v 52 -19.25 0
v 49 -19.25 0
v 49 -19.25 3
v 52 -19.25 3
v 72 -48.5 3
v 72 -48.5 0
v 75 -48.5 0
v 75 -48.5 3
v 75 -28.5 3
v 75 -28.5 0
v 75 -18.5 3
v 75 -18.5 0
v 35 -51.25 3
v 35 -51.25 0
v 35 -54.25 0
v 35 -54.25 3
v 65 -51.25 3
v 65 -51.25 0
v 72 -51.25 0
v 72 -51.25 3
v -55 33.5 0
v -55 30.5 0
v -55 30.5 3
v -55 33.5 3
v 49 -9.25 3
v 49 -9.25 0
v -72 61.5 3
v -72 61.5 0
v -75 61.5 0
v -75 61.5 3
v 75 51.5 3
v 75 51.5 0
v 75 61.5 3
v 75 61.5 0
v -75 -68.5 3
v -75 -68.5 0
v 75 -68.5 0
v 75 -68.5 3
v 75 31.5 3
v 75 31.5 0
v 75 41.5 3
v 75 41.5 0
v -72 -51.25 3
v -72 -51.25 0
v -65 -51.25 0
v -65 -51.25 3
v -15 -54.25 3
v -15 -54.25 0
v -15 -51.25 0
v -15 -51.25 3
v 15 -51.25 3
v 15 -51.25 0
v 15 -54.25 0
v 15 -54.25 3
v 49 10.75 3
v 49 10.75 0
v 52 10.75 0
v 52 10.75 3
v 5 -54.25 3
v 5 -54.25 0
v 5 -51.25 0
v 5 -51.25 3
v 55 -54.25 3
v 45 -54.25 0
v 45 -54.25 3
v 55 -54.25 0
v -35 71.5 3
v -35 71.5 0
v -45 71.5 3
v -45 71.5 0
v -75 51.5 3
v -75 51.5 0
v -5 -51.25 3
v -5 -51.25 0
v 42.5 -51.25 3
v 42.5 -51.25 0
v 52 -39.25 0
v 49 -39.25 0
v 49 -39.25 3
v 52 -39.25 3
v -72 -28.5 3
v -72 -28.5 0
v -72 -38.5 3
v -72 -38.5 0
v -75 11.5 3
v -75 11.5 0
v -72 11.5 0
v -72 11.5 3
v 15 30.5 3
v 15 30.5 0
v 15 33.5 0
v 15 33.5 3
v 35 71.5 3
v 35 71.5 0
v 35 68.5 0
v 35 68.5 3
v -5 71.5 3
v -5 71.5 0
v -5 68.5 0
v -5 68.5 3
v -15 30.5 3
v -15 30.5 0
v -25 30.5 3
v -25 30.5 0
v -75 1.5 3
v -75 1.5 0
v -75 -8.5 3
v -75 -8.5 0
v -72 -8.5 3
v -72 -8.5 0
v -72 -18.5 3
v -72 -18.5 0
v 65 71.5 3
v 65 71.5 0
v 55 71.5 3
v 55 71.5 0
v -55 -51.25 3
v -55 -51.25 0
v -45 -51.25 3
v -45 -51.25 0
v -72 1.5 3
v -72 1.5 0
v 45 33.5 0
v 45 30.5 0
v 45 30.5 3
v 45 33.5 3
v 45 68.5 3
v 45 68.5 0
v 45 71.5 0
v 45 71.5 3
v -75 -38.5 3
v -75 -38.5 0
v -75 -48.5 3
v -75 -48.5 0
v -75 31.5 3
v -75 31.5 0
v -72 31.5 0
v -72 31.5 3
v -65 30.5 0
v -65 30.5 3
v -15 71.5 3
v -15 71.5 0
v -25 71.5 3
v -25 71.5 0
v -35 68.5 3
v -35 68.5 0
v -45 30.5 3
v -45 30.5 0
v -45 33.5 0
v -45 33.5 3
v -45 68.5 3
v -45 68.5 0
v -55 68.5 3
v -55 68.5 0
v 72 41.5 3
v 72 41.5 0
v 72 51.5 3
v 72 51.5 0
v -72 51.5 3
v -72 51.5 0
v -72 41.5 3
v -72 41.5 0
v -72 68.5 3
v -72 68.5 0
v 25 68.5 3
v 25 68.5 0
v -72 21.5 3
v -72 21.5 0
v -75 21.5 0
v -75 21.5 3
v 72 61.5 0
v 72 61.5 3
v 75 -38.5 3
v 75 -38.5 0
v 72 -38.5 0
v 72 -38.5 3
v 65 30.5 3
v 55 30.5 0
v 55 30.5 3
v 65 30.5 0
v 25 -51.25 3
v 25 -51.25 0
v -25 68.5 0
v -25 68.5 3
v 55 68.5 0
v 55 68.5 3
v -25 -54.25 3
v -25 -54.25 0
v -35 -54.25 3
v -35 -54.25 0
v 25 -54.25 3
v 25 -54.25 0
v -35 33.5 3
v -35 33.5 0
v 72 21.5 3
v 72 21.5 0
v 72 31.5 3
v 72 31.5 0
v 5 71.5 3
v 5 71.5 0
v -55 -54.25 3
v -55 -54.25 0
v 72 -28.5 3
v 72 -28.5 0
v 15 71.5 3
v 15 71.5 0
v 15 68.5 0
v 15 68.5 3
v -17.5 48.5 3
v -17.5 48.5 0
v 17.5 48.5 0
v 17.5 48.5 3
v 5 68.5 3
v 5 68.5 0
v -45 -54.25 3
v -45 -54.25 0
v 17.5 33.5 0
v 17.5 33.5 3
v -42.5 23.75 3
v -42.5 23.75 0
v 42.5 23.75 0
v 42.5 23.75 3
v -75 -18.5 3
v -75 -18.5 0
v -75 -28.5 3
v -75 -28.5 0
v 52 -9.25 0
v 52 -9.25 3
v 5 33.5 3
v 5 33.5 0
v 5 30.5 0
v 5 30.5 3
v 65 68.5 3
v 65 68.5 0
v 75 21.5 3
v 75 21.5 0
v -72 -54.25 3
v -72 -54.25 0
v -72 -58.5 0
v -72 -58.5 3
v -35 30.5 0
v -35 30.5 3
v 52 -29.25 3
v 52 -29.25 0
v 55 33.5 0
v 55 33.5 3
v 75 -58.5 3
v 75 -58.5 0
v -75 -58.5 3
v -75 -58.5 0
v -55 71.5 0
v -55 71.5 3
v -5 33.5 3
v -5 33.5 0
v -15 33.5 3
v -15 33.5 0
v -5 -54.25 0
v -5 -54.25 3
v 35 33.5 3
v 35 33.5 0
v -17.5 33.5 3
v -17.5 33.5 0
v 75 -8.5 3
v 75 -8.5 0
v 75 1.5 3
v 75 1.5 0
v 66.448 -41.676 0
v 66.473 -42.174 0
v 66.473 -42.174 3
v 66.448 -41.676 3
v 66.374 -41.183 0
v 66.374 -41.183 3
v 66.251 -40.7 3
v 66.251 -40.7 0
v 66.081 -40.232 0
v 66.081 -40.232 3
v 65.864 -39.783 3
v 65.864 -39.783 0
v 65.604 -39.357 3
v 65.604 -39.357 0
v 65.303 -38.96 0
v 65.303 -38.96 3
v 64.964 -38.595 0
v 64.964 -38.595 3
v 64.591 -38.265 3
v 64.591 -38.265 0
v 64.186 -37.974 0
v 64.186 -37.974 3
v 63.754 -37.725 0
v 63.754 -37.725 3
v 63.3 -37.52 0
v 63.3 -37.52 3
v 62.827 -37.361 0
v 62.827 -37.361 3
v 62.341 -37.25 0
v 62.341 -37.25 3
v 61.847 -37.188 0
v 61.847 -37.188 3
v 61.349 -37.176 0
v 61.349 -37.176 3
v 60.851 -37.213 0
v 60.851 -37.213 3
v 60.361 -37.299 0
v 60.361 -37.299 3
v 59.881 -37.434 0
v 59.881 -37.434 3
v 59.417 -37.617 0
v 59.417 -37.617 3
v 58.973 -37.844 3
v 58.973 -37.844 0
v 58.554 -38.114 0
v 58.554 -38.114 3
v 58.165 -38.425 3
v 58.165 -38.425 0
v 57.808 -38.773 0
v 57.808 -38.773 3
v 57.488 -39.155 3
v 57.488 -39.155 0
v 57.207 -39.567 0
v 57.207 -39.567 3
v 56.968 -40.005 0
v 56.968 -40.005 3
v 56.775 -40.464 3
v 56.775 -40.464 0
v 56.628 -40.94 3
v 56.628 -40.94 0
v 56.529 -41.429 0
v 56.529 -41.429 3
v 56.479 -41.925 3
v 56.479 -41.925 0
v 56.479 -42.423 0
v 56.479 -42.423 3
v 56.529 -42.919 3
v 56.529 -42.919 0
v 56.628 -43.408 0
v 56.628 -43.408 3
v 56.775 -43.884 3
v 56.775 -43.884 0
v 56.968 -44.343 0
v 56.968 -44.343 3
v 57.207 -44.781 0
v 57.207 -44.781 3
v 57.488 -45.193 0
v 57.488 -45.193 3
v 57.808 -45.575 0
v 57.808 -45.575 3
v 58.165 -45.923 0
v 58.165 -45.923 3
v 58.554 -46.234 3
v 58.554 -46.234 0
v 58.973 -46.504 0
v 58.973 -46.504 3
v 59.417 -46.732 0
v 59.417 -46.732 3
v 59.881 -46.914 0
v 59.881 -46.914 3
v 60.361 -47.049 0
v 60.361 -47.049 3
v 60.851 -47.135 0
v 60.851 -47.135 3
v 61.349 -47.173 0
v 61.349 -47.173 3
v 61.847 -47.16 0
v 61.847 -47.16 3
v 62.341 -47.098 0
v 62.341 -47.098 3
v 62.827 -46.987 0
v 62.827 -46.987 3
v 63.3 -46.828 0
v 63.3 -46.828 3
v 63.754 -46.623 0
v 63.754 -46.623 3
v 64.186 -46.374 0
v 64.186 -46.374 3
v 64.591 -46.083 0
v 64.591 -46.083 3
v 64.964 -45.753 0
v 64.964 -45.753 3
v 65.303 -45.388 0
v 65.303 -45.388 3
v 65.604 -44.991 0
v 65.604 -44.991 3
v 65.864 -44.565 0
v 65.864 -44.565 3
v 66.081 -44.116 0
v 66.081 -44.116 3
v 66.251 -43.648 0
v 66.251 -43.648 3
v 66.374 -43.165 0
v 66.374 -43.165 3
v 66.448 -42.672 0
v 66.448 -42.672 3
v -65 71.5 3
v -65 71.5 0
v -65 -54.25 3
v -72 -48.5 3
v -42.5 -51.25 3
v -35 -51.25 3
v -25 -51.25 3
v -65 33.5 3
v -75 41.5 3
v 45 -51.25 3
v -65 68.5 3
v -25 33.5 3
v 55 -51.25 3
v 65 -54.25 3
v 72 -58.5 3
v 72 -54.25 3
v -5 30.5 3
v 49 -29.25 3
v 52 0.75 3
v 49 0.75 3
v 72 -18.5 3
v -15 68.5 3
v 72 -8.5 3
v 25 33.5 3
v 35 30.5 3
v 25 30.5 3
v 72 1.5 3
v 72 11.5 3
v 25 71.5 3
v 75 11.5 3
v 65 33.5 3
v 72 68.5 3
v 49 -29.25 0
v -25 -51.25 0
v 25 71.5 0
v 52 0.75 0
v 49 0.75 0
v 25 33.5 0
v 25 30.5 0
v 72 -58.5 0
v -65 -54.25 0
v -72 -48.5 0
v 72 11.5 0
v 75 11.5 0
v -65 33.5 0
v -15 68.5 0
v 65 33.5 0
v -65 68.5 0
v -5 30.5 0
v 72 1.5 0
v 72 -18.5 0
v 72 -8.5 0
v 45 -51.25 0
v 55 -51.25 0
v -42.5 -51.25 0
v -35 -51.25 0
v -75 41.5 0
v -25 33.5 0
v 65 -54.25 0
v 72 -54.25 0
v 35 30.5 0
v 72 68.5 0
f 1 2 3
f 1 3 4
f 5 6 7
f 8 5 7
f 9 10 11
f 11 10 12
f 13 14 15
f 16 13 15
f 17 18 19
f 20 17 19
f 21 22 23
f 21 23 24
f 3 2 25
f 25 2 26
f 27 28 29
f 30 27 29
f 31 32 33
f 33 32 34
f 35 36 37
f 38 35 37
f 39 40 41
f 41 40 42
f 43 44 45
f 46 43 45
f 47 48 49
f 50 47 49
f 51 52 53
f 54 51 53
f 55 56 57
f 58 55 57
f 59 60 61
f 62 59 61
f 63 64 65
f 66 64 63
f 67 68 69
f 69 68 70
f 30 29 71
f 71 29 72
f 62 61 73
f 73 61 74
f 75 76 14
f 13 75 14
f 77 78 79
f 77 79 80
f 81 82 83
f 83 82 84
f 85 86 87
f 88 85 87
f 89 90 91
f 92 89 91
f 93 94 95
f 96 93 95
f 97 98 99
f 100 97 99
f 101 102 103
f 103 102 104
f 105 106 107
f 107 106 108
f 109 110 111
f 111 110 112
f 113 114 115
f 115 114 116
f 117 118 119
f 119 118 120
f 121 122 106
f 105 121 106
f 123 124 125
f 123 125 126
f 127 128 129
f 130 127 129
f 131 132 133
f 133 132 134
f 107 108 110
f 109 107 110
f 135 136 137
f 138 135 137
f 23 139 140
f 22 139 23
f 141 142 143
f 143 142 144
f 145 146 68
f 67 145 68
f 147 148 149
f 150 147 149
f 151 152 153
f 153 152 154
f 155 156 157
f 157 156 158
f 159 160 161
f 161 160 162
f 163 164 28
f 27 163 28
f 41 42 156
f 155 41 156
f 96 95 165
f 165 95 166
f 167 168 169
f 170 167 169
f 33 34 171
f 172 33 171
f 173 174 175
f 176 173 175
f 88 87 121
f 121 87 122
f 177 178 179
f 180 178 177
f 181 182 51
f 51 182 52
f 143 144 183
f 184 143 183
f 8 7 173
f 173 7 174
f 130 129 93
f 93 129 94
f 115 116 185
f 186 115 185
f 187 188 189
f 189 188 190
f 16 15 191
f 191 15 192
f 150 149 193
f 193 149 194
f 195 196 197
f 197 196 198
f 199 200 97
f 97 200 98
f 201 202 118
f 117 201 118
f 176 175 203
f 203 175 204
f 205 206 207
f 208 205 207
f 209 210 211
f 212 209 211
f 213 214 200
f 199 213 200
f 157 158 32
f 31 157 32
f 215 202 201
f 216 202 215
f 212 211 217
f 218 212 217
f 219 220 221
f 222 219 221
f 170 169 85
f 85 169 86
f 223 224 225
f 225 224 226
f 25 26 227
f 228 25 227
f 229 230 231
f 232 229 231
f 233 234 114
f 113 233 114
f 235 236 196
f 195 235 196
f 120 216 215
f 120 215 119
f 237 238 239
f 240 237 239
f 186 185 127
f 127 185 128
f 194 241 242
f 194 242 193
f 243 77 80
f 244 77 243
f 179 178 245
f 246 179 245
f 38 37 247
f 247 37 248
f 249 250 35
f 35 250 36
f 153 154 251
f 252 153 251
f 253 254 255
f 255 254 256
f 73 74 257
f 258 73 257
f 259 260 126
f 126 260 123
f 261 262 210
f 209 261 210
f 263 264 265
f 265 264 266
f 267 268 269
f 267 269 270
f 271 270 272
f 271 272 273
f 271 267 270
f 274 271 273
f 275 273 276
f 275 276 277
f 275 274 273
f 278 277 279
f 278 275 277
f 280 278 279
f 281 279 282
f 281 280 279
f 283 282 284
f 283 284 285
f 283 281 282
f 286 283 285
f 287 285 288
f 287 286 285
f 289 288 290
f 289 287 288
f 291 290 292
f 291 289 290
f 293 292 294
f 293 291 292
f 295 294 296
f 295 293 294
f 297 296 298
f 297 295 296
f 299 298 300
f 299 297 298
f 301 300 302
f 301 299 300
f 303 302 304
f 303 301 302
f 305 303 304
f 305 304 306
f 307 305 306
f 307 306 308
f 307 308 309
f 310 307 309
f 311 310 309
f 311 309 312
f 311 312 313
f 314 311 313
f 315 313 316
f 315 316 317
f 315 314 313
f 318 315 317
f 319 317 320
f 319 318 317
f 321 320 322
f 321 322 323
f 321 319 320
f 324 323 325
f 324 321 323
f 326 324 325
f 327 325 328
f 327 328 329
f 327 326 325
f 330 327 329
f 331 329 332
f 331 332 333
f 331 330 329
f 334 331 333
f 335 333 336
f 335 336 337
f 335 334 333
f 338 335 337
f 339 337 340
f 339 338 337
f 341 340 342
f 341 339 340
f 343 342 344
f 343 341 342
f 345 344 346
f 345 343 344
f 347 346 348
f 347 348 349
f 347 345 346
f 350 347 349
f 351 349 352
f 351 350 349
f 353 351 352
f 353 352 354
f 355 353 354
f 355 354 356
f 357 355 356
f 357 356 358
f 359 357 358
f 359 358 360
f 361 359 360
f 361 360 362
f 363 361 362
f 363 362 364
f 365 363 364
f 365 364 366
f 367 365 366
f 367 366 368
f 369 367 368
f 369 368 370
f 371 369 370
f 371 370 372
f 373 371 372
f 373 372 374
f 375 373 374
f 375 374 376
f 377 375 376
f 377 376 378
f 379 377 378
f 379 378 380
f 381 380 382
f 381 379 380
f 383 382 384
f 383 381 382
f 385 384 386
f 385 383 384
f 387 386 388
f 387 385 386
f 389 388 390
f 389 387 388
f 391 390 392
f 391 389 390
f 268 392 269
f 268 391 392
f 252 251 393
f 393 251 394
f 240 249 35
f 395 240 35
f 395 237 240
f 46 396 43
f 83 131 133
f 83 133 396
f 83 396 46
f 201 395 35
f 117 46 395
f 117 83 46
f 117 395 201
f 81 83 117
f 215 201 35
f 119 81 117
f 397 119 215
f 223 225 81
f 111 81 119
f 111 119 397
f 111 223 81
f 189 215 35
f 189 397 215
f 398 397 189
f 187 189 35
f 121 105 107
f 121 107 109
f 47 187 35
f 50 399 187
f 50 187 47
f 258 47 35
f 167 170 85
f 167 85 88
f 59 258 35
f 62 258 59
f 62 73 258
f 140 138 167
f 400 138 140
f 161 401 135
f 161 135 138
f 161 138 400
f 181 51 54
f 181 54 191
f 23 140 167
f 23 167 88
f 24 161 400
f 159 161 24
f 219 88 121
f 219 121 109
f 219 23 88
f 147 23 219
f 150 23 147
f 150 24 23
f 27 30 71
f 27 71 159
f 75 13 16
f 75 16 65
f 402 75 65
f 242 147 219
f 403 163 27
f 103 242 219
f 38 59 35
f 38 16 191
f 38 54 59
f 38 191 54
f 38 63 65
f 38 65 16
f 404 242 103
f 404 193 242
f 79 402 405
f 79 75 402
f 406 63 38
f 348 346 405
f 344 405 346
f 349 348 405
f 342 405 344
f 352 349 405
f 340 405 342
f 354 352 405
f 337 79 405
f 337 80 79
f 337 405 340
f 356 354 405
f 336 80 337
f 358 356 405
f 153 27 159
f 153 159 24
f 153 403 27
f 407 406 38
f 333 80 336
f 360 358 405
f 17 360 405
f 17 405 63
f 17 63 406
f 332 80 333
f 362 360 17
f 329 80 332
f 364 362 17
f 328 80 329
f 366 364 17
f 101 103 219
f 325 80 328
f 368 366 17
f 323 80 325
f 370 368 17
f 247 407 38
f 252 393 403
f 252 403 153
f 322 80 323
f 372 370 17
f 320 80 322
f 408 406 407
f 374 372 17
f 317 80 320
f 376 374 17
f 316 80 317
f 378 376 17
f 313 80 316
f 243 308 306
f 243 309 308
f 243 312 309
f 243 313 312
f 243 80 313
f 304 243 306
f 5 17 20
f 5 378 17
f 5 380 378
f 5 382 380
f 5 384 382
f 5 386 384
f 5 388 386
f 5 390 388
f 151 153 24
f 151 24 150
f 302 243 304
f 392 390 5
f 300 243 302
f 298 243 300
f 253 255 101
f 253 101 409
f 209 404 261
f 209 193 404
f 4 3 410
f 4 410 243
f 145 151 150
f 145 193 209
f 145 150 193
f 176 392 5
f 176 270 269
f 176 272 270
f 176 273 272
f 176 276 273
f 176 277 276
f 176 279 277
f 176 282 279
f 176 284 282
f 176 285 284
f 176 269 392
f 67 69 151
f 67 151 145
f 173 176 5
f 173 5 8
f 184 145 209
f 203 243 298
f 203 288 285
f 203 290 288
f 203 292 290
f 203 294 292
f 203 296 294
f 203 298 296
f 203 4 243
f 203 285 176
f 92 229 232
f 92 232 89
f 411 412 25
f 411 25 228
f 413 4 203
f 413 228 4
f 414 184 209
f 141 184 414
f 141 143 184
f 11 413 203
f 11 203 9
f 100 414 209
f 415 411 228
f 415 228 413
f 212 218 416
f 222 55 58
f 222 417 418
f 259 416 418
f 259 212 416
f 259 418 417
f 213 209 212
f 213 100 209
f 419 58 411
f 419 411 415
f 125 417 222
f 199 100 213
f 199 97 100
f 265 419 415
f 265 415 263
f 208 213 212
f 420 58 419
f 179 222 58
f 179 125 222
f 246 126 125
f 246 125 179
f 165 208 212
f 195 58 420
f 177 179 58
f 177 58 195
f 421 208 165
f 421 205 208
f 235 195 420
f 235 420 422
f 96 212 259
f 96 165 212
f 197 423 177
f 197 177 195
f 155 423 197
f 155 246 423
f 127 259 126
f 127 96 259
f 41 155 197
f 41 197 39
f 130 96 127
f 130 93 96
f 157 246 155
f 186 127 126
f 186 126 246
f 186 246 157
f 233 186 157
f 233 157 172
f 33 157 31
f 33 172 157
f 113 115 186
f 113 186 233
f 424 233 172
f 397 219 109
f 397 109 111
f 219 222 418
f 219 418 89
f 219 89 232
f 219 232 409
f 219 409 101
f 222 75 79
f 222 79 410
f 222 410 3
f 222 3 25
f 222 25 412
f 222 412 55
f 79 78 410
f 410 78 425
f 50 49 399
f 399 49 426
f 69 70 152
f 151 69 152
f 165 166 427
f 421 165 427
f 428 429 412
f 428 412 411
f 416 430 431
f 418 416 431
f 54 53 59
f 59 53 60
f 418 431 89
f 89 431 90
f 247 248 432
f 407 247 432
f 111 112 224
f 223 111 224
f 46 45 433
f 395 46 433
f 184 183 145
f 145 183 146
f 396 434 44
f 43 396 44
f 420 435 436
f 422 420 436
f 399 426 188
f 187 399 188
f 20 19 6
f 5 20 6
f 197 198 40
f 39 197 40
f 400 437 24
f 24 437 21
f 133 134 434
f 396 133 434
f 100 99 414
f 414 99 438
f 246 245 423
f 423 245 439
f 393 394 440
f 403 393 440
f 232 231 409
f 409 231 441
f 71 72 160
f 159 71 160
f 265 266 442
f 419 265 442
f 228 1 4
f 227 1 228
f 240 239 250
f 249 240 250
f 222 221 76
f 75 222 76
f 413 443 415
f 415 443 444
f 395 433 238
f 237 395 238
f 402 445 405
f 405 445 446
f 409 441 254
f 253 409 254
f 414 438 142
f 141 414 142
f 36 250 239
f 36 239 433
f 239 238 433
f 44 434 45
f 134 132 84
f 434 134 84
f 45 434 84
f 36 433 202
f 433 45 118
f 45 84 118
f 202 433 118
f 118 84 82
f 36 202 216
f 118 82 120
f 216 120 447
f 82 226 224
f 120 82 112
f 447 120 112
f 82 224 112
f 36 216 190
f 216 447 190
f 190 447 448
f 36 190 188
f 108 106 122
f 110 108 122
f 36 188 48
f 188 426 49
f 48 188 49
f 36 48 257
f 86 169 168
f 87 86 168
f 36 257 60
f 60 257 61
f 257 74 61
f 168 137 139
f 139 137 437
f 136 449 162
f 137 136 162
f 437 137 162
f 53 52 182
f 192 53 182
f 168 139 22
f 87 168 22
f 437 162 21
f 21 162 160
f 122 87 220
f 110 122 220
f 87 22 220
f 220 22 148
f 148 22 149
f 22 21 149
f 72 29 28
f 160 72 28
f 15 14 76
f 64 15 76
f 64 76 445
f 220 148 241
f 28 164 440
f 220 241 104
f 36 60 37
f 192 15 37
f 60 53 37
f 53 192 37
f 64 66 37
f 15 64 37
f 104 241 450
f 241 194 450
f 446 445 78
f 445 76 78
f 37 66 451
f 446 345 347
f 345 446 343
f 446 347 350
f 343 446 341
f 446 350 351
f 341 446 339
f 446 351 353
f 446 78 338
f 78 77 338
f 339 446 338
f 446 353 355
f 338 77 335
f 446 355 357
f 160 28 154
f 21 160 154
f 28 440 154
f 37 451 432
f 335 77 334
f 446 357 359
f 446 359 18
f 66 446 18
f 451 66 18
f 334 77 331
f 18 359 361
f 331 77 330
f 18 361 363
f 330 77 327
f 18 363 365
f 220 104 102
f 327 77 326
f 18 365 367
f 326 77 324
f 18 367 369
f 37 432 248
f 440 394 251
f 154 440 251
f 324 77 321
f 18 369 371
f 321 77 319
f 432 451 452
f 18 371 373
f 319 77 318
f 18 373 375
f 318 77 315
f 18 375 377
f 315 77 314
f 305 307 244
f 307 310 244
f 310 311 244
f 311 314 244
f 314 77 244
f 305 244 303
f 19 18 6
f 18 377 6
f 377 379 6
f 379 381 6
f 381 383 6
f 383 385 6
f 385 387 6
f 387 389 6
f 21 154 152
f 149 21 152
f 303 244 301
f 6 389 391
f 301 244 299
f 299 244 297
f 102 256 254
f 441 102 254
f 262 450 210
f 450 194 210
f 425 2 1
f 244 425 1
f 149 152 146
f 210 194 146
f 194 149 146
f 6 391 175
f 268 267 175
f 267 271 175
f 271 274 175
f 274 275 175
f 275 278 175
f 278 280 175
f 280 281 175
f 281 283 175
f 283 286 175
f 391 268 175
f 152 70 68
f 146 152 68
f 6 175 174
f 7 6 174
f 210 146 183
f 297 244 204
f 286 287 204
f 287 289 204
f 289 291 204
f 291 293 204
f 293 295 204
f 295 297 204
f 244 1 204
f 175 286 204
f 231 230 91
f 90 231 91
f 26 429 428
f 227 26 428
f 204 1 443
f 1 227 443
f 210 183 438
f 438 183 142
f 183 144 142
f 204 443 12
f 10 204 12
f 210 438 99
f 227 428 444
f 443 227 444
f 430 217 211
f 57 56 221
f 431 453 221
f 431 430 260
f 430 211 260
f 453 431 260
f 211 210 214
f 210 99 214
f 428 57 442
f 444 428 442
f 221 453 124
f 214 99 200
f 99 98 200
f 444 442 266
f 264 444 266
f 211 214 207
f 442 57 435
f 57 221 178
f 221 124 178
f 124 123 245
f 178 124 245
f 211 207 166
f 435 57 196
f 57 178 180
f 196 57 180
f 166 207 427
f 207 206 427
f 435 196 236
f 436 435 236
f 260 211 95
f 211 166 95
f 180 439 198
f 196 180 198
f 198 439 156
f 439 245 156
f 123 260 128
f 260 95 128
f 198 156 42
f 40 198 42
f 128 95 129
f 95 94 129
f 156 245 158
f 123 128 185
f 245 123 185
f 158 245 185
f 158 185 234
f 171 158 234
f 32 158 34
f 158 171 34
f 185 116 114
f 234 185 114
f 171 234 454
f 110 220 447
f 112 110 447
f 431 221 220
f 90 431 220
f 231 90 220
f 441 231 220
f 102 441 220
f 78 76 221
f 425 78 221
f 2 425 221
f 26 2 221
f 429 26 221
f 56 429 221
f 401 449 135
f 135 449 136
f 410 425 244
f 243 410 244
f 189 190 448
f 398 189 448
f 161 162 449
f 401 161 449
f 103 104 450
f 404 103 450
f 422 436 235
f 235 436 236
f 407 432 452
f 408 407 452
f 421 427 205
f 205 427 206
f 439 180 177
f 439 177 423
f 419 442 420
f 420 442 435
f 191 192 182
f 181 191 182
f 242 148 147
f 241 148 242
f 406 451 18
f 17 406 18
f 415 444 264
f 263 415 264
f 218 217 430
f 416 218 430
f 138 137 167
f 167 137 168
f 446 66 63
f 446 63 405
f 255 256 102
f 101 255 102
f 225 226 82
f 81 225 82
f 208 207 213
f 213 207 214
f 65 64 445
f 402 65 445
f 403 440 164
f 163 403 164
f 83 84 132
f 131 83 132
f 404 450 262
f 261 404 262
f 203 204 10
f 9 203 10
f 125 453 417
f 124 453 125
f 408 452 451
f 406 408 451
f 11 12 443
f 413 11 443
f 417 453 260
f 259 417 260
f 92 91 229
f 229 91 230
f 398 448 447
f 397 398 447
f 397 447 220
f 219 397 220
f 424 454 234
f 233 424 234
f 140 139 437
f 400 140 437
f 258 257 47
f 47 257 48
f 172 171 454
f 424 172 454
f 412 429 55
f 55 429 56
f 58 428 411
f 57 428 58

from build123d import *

# Parameters (mm, degrees)
CROQUIS1_W              = 10
CROQUIS1_H              = 3
CROQUIS1_W_2            = 3
CROQUIS1_H_2            = 10
CROQUIS1_R              = 5
SALIENTE_EXTRUIR1_DEPTH = 3


with BuildPart() as part:
    # Croquis1 → Saliente-Extruir1 (new body)
    with BuildSketch(Plane.XY):
        Polygon((-35, 71.5), (-45, 71.5), (-45, 68.5), (-55, 68.5), (-55, 71.5), (-65, 71.5), (-65, 68.5), (-72, 68.5), (-72, 61.5), (-75, 61.5), (-75, 51.5), (-72, 51.5), (-72, 41.5), (-75, 41.5), (-75, 31.5), (-72, 31.5), (-72, 21.5), (-75, 21.5), (-75, 11.5), (-72, 11.5), (-72, 1.5), (-75, 1.5), (-75, -8.5), (-72, -8.5), (-72, -18.5), (-75, -18.5), (-75, -28.5), (-72, -28.5), (-72, -38.5), (-75, -38.5), (-75, -48.5), (-72, -48.5), (-72, -51.25), (-65, -51.25), (-65, -54.25), (-72, -54.25), (-72, -58.5), (-75, -58.5), (-75, -68.5), (-72, -68.5), (72, -68.5), (75, -68.5), (75, -58.5), (72, -58.5), (72, -54.25), (65, -54.25), (65, -51.25), (72, -51.25), (72, -48.5), (75, -48.5), (75, -38.5), (72, -38.5), (72, -28.5), (75, -28.5), (75, -18.5), (72, -18.5), (72, -8.5), (75, -8.5), (75, 1.5), (72, 1.5), (72, 11.5), (75, 11.5), (75, 21.5), (72, 21.5), (72, 31.5), (75, 31.5), (75, 41.5), (72, 41.5), (72, 51.5), (75, 51.5), (75, 61.5), (72, 61.5), (72, 68.5), (65, 68.5), (65, 71.5), (55, 71.5), (55, 68.5), (45, 68.5), (45, 71.5), (35, 71.5), (35, 68.5), (25, 68.5), (25, 71.5), (15, 71.5), (15, 68.5), (5, 68.5), (5, 71.5), (-5, 71.5), (-5, 68.5), (-15, 68.5), (-15, 71.5), (-25, 71.5), (-25, 68.5), (-35, 68.5), align=None)
        with Locations((-50, -52.75)):
            Rectangle(CROQUIS1_W, CROQUIS1_H, mode=Mode.SUBTRACT)
        Polygon((-35, -54.25), (-35, -51.25), (-42.5, -51.25), (-42.5, 23.75), (42.5, 23.75), (42.5, -51.25), (35, -51.25), (35, -54.25), (25, -54.25), (25, -51.25), (15, -51.25), (15, -54.25), (5, -54.25), (5, -51.25), (-5, -51.25), (-5, -54.25), (-15, -54.25), (-15, -51.25), (-25, -51.25), (-25, -54.25), align=None, mode=Mode.SUBTRACT)
        with Locations((50, -52.75)):
            Rectangle(CROQUIS1_W, CROQUIS1_H, mode=Mode.SUBTRACT)
        with Locations((50.5, -34.25)):
            Rectangle(CROQUIS1_W_2, CROQUIS1_H_2, mode=Mode.SUBTRACT)
        with Locations((61.473213392, -42.174074015)):
            Circle(CROQUIS1_R, mode=Mode.SUBTRACT)
        with Locations((50.5, -14.25)):
            Rectangle(CROQUIS1_W_2, CROQUIS1_H_2, mode=Mode.SUBTRACT)
        with Locations((-60, 32)):
            Rectangle(CROQUIS1_W, CROQUIS1_H, mode=Mode.SUBTRACT)
        with Locations((-40, 32)):
            Rectangle(CROQUIS1_W, CROQUIS1_H, mode=Mode.SUBTRACT)
        Polygon((-25, 30.5), (-25, 33.5), (-17.5, 33.5), (-17.5, 48.5), (17.5, 48.5), (17.5, 33.5), (25, 33.5), (25, 30.5), (15, 30.5), (15, 33.5), (5, 33.5), (5, 30.5), (-5, 30.5), (-5, 33.5), (-15, 33.5), (-15, 30.5), align=None, mode=Mode.SUBTRACT)
        with Locations((50.5, 5.75)):
            Rectangle(CROQUIS1_W_2, CROQUIS1_H_2, mode=Mode.SUBTRACT)
        with Locations((40, 32)):
            Rectangle(CROQUIS1_W, CROQUIS1_H, mode=Mode.SUBTRACT)
        with Locations((60, 32)):
            Rectangle(CROQUIS1_W, CROQUIS1_H, mode=Mode.SUBTRACT)
    extrude(amount=SALIENTE_EXTRUIR1_DEPTH)


solid = part.part
